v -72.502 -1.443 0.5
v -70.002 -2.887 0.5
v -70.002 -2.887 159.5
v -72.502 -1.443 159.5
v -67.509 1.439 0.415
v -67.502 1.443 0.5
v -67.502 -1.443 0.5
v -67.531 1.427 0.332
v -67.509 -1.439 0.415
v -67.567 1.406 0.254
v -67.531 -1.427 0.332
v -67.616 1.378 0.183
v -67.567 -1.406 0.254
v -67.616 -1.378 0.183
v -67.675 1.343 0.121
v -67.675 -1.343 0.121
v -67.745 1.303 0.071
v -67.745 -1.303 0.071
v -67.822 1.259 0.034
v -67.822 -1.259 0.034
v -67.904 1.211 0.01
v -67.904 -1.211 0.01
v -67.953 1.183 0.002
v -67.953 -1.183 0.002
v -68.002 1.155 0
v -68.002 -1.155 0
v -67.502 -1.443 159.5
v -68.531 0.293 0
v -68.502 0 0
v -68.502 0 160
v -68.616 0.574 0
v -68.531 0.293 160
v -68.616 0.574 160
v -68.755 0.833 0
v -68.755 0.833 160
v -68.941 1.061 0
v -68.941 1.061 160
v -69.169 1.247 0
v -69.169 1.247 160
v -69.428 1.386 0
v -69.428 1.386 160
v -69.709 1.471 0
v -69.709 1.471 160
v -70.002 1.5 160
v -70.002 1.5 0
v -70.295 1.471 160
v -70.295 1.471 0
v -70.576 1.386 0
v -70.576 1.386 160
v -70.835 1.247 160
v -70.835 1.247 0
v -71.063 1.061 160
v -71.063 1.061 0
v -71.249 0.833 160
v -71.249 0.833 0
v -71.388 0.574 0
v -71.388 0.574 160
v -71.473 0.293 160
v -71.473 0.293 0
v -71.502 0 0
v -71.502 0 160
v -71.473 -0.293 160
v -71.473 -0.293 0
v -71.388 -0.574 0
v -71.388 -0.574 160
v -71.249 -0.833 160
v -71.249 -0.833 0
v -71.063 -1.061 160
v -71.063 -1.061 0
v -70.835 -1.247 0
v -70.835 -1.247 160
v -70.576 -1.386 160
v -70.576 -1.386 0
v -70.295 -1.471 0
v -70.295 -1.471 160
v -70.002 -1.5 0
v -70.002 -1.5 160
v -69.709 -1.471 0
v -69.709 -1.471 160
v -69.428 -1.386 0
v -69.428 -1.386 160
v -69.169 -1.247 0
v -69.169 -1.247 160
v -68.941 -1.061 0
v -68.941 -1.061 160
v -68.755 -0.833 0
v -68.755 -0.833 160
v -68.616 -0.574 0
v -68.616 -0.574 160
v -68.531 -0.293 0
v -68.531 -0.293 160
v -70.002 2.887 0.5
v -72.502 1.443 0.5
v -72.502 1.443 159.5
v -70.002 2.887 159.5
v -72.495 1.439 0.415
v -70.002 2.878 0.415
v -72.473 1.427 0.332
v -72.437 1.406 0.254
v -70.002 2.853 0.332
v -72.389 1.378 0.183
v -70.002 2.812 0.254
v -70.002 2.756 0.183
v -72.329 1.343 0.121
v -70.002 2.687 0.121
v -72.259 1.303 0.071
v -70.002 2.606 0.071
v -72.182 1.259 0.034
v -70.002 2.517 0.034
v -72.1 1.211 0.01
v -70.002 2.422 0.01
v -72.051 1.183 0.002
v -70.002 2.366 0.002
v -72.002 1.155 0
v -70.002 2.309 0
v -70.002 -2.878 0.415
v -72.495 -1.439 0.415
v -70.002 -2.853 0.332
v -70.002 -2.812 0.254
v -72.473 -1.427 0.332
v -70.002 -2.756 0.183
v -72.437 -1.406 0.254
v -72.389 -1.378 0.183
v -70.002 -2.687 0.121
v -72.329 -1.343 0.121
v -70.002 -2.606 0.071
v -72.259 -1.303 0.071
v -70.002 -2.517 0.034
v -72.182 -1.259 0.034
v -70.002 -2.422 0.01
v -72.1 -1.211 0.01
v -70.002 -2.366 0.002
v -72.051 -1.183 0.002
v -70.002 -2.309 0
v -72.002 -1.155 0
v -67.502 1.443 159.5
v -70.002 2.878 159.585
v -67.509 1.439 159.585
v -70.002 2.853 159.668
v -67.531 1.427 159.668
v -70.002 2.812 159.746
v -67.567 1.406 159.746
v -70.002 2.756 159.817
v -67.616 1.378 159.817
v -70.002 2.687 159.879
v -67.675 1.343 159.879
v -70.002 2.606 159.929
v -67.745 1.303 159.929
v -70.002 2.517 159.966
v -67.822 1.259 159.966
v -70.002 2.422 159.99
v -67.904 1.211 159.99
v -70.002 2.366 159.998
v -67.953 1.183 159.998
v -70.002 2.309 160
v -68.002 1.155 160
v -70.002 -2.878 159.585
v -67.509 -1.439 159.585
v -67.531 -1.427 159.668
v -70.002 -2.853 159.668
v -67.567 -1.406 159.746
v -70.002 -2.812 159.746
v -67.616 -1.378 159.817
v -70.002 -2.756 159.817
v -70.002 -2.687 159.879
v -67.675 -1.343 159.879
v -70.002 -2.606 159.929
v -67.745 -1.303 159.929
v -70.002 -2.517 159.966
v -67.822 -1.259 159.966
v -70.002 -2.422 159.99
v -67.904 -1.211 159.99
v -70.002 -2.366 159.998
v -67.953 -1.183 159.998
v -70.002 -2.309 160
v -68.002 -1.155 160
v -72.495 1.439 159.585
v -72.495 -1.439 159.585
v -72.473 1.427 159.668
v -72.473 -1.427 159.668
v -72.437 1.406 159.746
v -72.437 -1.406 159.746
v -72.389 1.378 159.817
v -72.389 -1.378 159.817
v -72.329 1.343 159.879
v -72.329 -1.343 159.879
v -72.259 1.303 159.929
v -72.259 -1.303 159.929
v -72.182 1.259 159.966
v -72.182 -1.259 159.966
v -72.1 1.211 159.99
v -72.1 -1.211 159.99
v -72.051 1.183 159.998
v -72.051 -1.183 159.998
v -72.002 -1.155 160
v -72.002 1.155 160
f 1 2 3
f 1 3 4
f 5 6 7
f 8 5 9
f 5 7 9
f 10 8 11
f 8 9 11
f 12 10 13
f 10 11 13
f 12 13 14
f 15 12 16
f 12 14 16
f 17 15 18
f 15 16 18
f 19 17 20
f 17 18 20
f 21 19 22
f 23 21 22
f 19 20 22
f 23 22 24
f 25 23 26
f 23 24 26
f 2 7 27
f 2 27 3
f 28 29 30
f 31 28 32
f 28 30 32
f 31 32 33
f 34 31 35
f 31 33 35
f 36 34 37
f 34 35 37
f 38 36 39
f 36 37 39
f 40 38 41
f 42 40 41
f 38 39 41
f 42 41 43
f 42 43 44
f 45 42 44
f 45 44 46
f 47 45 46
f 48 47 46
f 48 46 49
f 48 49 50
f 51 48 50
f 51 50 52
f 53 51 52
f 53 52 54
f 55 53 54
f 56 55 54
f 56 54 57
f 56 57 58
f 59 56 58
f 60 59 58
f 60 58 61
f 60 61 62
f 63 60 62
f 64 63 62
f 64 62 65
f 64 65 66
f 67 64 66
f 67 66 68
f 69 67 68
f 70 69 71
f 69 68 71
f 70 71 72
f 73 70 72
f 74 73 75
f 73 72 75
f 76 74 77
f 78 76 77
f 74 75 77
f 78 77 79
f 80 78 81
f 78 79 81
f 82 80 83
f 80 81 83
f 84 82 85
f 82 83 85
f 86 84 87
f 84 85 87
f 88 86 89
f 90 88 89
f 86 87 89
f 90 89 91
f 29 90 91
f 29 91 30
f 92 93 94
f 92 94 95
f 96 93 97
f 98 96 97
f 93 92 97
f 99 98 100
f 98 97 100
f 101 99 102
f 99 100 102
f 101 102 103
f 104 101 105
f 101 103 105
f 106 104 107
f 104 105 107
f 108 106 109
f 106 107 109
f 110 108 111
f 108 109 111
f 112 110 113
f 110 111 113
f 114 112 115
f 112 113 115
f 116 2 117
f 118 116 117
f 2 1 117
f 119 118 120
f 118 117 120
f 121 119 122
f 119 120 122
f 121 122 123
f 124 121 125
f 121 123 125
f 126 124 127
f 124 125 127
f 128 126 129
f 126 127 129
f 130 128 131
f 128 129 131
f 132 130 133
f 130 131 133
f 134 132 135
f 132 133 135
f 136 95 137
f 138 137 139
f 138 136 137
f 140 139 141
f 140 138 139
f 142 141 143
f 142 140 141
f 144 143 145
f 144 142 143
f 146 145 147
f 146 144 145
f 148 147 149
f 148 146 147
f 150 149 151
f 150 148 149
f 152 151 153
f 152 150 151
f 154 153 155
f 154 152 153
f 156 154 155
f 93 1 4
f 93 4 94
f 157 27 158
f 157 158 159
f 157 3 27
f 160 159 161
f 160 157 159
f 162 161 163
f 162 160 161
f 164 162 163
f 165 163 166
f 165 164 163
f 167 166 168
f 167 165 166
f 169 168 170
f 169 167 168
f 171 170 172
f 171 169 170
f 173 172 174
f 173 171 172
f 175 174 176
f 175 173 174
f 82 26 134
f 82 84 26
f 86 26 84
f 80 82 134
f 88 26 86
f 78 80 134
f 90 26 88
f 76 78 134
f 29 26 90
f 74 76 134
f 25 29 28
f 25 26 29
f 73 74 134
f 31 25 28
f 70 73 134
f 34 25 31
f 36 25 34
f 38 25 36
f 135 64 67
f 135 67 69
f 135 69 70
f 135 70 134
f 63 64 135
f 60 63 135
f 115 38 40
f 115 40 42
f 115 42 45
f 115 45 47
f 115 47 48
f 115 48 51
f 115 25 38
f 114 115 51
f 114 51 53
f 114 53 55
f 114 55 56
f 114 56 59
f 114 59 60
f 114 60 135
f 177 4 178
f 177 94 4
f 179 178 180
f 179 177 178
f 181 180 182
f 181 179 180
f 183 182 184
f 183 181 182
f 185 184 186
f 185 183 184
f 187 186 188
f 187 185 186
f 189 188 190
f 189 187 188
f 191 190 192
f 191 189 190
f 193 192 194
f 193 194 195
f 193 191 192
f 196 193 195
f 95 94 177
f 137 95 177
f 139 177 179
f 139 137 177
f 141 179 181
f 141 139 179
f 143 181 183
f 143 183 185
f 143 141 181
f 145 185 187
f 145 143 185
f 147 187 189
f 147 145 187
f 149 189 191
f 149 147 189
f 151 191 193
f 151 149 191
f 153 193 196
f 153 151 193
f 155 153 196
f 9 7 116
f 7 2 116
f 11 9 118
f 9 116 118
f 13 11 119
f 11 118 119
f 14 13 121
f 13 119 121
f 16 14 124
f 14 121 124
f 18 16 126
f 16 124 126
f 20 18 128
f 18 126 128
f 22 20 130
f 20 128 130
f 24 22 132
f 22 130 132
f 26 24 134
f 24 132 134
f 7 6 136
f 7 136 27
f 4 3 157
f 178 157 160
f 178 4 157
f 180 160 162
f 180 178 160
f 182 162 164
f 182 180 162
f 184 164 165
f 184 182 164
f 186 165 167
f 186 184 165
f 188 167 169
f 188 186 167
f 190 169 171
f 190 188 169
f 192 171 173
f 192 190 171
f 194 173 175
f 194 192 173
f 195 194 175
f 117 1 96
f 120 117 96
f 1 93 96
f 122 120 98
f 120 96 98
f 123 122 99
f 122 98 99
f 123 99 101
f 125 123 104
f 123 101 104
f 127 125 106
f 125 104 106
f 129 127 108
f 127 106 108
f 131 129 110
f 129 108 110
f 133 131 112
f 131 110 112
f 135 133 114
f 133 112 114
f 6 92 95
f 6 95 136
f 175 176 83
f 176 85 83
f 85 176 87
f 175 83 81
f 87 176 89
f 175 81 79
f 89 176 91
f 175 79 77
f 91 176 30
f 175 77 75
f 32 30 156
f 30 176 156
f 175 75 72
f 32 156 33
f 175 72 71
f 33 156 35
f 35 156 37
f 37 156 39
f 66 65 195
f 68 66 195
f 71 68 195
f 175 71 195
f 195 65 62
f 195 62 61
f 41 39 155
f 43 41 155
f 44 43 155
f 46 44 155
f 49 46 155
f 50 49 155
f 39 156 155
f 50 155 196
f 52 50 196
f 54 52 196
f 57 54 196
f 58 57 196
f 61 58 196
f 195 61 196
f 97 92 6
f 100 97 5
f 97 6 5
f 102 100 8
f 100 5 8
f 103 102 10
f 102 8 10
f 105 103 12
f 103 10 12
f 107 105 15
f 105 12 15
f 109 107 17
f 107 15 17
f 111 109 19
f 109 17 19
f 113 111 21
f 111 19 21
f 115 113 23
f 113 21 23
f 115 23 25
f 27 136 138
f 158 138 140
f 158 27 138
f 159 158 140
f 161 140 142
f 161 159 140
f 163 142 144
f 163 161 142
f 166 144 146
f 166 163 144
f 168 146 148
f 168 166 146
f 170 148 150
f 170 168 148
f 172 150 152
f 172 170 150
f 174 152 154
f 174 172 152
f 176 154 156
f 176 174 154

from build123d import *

# Parameters (mm, degrees)
RESSALTO_EXTRUS_O1_DEPTH = 160
FILETE1_R                = 0.5
ESBO_O2_R                = 1.5
CORTE_EXTRUS_O1_DEPTH    = 161


with BuildPart() as part:
    # Esboço1 → Ressalto-extrusão1 (new body)
    with BuildSketch(Plane(origin=(0, 0, 0), x_dir=(-1, 0, 0), z_dir=(0, 0, -1))):
        Polygon((67.502122675, -1.443375673), (70.002122675, -2.886751346), (72.502122675, -1.443375673), (72.502122675, 1.443375673), (70.002122675, 2.886751346), (67.502122675, 1.443375673), align=None)
    extrude(amount=-RESSALTO_EXTRUS_O1_DEPTH)

    # Filete1
    filete1_edges = [part.edges().sort_by_distance(p)[0] for p in [
        (-71.252122675, -2.165063509, 160),
        (-72.502122675, 0, 160),
        (-71.252122675, 2.165063509, 160),
        (-68.752122675, 2.165063509, 160),
        (-67.502122675, 0, 160),
        (-68.752122675, 2.165063509, 0),
        (-71.252122675, 2.165063509, 0),
        (-72.502122675, 0, 0),
        (-71.252122675, -2.165063509, 0),
        (-68.752122675, -2.165063509, 0),
        (-67.502122675, 0, 0),
        (-68.752122675, -2.165063509, 160),
    ]]
    fillet(filete1_edges, radius=FILETE1_R)

    # Esboço2 → Corte-extrusão1 (cut, through all)
    with BuildSketch(Plane.XY.offset(160)):
        with Locations((-70.002122675, 0)):
            Circle(ESBO_O2_R)
    extrude(amount=-CORTE_EXTRUS_O1_DEPTH, mode=Mode.SUBTRACT)


solid = part.part
